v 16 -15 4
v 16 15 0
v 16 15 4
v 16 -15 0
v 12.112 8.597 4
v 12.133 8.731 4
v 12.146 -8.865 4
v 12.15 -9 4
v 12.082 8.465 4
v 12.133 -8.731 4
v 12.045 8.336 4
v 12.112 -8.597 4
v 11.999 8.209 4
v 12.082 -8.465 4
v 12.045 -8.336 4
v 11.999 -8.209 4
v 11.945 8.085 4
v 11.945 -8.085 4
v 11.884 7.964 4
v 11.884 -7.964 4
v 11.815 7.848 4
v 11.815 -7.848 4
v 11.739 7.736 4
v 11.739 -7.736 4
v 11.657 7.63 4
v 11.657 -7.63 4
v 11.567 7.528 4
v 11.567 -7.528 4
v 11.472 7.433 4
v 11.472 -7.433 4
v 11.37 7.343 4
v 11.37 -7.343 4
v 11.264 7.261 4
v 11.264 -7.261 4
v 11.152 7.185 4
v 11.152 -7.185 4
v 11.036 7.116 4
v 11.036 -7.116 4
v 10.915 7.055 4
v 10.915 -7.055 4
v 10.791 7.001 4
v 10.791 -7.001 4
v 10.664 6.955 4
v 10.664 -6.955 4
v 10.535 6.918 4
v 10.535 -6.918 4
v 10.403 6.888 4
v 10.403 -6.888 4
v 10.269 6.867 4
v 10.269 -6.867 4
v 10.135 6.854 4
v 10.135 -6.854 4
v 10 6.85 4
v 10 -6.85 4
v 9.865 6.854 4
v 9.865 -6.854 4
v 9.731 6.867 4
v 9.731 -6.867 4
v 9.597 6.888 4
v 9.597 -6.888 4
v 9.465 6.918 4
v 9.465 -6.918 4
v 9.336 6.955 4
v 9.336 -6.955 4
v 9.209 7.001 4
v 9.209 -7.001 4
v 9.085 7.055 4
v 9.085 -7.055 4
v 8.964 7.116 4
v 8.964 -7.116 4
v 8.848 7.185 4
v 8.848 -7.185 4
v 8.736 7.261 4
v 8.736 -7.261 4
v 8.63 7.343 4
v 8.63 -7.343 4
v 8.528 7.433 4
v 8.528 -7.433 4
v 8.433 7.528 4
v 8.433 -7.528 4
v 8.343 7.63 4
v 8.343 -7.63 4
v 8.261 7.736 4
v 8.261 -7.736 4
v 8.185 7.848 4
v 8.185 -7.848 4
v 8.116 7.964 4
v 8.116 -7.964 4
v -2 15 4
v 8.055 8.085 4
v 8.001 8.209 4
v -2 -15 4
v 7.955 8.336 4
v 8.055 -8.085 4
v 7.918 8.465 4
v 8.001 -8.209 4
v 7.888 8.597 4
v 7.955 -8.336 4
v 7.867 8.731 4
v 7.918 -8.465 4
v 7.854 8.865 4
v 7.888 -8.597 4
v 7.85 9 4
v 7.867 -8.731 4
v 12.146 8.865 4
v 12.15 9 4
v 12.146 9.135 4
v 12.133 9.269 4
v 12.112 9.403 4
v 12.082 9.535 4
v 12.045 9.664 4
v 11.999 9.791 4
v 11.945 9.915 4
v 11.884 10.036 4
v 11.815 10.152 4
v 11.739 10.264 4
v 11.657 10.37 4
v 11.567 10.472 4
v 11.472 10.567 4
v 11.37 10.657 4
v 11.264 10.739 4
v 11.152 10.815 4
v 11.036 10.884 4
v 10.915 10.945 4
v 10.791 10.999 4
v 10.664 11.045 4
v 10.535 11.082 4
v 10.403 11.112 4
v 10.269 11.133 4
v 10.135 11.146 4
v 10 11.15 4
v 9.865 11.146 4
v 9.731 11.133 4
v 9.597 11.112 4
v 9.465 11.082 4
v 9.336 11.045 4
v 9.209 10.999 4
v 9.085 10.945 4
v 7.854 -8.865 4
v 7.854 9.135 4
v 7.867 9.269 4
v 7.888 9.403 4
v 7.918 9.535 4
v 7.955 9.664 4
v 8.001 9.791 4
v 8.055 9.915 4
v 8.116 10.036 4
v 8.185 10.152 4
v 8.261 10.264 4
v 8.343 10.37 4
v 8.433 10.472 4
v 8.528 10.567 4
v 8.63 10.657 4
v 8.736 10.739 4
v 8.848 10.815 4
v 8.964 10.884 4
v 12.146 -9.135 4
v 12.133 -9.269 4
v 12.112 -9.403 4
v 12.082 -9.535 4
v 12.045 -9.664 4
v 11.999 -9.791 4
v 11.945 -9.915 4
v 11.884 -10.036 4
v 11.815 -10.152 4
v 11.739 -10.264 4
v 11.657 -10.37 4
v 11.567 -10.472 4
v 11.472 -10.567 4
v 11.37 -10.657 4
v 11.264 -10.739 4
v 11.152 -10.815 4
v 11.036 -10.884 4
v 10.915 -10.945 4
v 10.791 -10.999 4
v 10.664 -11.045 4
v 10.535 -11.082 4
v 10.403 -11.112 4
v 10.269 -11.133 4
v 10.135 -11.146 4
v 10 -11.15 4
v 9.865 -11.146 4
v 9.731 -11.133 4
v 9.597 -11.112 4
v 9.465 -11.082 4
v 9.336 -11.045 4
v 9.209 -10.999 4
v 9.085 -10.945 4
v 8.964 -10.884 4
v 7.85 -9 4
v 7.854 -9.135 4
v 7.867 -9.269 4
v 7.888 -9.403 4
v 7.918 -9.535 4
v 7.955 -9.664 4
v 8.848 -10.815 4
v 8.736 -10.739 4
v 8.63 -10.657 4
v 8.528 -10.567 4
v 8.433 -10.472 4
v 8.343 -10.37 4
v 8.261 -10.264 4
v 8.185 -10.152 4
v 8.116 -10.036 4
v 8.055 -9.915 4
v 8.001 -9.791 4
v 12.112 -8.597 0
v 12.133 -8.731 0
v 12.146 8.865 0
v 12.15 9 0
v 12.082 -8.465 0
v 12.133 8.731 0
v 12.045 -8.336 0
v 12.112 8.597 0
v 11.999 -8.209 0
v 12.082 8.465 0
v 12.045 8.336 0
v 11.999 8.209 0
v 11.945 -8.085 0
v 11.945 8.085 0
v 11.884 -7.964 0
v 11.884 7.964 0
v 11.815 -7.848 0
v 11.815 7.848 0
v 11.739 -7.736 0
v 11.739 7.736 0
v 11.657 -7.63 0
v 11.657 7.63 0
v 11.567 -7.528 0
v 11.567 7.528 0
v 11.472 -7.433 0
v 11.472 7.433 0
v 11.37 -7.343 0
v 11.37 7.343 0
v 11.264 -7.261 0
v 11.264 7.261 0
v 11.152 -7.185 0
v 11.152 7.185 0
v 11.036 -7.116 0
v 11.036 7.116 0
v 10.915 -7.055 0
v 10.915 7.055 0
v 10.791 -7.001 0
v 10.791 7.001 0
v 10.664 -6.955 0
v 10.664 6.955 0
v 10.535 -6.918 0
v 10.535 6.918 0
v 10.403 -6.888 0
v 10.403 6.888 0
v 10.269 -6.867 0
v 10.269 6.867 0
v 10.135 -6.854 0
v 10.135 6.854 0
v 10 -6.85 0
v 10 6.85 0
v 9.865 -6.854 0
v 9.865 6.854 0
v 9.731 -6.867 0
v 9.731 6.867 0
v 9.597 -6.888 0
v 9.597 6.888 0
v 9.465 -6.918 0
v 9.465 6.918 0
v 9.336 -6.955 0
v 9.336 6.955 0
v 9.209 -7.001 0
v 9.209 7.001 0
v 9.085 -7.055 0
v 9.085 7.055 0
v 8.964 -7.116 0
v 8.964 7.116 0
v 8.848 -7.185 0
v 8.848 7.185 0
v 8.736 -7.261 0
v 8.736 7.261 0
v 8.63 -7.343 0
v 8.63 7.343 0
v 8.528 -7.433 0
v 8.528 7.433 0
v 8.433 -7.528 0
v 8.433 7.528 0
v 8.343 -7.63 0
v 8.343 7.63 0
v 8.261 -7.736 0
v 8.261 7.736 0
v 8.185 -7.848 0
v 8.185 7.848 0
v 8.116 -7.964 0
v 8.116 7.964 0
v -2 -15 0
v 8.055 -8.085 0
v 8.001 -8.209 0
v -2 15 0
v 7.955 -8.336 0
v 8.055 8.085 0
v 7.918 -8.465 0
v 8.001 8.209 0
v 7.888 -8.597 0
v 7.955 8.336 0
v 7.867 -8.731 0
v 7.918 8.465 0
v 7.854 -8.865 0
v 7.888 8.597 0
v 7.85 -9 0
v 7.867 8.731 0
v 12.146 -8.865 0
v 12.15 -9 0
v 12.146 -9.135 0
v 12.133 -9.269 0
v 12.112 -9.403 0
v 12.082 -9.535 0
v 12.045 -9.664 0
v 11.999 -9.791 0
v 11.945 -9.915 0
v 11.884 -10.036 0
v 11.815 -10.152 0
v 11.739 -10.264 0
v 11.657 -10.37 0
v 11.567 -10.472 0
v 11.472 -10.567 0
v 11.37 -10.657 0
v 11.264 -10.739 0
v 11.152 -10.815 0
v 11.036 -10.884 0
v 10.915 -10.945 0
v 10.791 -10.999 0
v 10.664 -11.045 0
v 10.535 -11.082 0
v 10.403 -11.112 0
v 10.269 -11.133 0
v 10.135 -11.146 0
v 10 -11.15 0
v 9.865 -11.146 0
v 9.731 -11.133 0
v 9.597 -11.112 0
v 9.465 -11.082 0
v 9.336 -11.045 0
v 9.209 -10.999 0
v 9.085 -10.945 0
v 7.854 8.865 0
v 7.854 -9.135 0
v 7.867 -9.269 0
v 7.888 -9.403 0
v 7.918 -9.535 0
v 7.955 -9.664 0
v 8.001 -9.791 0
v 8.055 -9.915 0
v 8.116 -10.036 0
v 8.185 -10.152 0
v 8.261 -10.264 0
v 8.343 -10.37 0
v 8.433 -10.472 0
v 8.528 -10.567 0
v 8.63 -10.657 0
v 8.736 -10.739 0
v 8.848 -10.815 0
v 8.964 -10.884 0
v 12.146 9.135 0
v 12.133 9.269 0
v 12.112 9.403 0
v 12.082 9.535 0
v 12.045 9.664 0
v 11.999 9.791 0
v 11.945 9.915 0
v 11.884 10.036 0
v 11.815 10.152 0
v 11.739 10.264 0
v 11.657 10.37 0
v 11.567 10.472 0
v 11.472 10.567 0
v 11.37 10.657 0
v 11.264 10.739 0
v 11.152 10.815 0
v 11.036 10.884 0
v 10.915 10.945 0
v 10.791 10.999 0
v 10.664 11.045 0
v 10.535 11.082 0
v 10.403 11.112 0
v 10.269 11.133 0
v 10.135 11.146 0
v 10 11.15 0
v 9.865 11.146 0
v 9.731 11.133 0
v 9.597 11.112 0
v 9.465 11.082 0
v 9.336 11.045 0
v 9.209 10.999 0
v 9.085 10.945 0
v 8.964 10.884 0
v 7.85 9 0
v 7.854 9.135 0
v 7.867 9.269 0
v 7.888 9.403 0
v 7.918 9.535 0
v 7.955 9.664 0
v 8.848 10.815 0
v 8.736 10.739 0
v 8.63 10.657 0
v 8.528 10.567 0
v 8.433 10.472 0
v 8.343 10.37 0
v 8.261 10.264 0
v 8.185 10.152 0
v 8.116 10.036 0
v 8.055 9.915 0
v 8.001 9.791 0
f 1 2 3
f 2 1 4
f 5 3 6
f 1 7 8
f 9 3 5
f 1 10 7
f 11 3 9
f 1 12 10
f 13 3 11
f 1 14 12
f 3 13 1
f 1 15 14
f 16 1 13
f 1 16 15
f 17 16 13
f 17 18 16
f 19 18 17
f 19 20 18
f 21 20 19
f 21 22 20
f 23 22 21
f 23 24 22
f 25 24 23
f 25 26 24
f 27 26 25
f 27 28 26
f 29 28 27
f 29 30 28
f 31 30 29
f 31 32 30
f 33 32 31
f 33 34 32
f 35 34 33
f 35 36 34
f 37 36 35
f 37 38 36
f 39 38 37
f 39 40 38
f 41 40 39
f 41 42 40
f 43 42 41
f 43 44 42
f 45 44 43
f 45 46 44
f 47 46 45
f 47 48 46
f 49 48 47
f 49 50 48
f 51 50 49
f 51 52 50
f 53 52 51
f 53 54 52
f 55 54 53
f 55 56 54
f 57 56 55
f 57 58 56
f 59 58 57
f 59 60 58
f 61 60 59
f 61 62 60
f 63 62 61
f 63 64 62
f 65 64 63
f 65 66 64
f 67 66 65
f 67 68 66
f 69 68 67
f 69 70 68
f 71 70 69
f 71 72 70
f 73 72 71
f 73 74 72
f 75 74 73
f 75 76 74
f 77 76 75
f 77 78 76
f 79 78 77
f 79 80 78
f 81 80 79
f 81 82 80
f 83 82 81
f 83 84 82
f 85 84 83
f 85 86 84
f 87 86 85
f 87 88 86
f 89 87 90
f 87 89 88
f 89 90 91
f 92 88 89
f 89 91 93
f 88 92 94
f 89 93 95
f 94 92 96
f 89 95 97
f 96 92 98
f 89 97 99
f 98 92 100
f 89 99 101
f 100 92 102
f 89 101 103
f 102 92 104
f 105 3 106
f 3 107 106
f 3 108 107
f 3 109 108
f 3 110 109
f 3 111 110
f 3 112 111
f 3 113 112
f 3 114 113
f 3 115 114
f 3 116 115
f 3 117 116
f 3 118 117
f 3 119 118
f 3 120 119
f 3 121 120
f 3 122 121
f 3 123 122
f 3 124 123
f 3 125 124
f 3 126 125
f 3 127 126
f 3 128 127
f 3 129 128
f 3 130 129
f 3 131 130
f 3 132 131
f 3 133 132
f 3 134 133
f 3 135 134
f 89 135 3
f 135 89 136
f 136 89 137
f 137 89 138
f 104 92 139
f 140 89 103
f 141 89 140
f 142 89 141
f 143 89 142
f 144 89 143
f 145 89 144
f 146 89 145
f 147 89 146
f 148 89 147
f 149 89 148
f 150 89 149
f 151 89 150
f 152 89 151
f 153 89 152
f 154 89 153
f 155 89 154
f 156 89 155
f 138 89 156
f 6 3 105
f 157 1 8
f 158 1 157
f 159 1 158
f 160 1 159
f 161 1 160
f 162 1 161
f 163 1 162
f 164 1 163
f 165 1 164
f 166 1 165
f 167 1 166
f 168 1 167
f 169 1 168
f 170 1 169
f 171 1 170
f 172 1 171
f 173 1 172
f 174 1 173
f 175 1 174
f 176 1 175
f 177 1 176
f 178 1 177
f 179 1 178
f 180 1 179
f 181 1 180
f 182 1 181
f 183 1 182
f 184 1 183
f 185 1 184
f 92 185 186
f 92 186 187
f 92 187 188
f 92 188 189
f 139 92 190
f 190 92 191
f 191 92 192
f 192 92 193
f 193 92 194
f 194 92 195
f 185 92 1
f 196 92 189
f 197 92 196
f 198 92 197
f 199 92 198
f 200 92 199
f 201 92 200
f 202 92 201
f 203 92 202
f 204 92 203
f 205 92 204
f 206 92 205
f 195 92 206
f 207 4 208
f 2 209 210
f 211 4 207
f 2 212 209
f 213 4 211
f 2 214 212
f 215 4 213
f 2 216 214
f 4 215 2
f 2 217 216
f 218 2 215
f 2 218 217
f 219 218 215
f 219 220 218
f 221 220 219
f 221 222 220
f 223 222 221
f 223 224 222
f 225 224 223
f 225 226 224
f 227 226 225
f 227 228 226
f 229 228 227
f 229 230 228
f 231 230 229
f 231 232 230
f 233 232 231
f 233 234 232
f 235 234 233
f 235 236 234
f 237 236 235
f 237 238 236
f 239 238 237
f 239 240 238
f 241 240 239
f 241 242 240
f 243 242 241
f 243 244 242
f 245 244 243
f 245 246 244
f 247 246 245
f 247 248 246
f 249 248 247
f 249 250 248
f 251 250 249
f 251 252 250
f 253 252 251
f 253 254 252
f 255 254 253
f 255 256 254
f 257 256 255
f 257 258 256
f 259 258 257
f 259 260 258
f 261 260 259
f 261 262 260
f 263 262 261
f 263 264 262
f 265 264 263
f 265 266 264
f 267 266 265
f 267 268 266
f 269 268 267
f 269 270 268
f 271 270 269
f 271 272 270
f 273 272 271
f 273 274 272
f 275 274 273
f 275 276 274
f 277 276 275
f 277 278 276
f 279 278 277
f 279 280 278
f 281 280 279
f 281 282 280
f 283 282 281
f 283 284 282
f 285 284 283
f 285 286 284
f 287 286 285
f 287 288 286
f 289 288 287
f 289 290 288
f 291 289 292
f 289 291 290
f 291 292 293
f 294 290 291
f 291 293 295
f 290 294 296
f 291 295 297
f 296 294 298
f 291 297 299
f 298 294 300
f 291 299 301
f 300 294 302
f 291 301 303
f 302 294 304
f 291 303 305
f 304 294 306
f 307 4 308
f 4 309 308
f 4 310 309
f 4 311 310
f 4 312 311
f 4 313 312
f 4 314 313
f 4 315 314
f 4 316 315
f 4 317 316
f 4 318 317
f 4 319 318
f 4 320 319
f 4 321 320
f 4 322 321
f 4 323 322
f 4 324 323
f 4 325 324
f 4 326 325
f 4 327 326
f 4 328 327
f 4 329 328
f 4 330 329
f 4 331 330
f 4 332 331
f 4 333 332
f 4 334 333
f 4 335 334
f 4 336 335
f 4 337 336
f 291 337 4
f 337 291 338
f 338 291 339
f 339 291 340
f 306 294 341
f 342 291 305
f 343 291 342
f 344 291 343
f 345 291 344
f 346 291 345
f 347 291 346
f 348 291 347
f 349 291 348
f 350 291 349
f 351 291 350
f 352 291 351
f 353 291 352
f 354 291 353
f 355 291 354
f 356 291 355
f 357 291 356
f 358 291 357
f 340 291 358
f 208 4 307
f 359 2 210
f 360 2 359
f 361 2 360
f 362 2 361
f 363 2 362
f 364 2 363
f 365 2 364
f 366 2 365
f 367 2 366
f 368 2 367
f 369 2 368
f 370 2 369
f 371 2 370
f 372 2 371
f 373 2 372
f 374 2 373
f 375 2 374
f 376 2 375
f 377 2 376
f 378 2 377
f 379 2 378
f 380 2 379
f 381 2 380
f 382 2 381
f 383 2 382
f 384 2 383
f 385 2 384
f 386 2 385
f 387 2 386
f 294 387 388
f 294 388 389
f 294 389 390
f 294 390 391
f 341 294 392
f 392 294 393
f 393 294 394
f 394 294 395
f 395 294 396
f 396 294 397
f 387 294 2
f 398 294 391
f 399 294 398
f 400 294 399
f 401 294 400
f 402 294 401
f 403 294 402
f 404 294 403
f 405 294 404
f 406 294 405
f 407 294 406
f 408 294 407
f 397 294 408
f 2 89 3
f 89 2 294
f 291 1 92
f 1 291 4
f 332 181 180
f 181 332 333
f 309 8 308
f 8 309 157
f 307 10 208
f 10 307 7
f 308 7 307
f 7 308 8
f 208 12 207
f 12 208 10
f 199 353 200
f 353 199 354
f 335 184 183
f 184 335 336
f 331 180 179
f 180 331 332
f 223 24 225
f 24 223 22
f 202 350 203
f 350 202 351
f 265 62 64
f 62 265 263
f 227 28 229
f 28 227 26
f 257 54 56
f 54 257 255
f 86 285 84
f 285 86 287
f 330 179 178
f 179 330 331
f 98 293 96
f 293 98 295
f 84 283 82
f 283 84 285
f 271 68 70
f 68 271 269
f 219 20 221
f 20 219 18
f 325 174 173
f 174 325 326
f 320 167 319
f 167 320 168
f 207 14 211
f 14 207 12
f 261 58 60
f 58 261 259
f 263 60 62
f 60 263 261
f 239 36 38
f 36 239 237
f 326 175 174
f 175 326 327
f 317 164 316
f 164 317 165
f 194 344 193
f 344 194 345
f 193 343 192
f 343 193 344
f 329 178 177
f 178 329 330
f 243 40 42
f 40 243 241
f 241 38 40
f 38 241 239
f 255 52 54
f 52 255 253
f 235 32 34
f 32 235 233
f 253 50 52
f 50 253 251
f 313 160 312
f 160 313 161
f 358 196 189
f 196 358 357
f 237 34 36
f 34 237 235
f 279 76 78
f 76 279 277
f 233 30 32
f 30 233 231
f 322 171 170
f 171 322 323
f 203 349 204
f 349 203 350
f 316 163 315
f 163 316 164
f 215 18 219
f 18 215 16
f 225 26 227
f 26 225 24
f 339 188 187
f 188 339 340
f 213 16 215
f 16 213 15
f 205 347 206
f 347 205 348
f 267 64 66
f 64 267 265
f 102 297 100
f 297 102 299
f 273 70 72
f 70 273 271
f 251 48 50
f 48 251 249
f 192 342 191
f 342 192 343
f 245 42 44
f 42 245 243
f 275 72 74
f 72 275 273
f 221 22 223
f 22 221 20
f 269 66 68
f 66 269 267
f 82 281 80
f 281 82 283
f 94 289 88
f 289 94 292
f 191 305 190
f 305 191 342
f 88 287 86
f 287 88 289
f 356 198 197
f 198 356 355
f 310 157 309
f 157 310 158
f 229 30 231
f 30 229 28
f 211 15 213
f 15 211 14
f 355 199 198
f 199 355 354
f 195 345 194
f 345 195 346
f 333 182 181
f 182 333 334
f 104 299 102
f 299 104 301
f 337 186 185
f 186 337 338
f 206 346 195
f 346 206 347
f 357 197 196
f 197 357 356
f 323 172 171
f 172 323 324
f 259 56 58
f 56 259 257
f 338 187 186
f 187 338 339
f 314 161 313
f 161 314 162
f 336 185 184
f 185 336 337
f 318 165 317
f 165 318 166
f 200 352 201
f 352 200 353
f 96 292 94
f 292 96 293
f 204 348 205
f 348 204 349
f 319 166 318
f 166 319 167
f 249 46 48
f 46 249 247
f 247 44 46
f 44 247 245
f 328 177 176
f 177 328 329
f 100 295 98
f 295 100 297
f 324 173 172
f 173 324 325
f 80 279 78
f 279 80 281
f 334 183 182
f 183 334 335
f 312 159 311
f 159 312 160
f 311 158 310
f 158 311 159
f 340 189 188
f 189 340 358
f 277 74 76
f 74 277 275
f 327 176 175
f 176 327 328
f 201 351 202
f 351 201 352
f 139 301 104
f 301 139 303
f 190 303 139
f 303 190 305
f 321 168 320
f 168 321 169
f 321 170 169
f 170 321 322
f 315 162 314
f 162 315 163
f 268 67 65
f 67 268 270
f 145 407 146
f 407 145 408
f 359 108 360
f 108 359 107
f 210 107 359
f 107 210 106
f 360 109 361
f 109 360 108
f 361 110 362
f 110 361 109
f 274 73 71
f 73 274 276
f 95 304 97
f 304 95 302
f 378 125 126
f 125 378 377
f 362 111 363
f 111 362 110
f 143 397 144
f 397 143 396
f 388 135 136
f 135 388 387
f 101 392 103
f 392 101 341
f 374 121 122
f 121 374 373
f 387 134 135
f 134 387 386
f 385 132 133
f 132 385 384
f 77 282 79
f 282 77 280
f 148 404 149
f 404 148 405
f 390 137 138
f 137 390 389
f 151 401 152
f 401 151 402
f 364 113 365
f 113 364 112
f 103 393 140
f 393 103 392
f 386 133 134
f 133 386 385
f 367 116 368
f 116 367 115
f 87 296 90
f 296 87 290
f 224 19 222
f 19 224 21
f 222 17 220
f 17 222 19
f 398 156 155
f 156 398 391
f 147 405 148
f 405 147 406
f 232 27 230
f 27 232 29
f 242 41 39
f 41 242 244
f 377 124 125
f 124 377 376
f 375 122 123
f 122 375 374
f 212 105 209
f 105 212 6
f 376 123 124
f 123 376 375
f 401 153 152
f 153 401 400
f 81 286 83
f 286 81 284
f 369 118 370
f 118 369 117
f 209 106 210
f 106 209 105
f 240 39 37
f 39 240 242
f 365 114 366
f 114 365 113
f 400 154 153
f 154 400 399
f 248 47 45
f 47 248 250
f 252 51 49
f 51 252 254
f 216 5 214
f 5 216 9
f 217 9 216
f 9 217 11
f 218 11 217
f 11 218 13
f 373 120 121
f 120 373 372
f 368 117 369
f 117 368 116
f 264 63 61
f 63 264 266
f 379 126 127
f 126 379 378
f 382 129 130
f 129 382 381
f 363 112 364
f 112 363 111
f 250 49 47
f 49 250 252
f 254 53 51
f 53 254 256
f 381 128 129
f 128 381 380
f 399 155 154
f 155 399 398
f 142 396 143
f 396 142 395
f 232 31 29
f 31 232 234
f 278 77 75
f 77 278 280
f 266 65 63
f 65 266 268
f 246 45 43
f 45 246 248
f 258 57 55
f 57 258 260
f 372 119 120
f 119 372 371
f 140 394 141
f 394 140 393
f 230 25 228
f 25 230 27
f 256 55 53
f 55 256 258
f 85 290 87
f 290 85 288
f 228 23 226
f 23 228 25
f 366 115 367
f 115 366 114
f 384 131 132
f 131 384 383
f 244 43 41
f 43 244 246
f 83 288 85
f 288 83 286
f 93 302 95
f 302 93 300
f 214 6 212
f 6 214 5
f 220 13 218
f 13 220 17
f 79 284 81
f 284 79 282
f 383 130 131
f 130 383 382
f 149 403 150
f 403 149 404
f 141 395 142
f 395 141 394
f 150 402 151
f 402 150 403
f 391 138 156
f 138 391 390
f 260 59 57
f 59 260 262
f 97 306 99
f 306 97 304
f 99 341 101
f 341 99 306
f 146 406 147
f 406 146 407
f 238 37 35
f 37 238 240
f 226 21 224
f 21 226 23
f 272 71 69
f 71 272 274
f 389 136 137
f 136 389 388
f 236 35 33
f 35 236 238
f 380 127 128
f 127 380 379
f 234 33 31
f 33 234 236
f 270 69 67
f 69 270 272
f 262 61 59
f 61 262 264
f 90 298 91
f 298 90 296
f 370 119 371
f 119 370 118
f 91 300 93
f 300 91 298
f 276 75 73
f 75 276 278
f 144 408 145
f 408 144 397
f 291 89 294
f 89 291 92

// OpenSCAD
/*
 * ChimeraMount.scad
 * v1.1.0 12th August 2017
 * Written by landie @ Thingiverse (Dave White)
 *
 * This script is licensed under the Creative Commons - Attribution - Non-Commercial license.
 *
 * http://www.thingiverse.com/thing:2381980
 *
 * A simple spacer to match teh X Carriage, customisable
 *
 */

// Variables you may want to adjust...
spacerThickness = 4; //[1:10]


/* [Hidden] */

touchMountBoltSpacing = 18;
touchMountLength = touchMountBoltSpacing + 12;
touchMountWidth = 16;
touchMountThickness = 4;

spacer();

module spacer() {
    translate([0,0,spacerThickness / 2])
    cube([touchMountThickness, touchMountLength, spacerThickness], center = true);
    
    difference() {
        // horizontal section
        translate([touchMountWidth / 2, 0, spacerThickness / 2])
        cube([touchMountWidth, touchMountLength, spacerThickness], center = true);
        
        translate([touchMountWidth / 2 + 2, -touchMountBoltSpacing / 2, 0])
        cylinder(d = 4.3, h = spacerThickness, $fn = 100);
        
        translate([touchMountWidth / 2 + 2, touchMountBoltSpacing / 2, 0])
        cylinder(d = 4.3, h = spacerThickness, $fn = 100);
    }
}
